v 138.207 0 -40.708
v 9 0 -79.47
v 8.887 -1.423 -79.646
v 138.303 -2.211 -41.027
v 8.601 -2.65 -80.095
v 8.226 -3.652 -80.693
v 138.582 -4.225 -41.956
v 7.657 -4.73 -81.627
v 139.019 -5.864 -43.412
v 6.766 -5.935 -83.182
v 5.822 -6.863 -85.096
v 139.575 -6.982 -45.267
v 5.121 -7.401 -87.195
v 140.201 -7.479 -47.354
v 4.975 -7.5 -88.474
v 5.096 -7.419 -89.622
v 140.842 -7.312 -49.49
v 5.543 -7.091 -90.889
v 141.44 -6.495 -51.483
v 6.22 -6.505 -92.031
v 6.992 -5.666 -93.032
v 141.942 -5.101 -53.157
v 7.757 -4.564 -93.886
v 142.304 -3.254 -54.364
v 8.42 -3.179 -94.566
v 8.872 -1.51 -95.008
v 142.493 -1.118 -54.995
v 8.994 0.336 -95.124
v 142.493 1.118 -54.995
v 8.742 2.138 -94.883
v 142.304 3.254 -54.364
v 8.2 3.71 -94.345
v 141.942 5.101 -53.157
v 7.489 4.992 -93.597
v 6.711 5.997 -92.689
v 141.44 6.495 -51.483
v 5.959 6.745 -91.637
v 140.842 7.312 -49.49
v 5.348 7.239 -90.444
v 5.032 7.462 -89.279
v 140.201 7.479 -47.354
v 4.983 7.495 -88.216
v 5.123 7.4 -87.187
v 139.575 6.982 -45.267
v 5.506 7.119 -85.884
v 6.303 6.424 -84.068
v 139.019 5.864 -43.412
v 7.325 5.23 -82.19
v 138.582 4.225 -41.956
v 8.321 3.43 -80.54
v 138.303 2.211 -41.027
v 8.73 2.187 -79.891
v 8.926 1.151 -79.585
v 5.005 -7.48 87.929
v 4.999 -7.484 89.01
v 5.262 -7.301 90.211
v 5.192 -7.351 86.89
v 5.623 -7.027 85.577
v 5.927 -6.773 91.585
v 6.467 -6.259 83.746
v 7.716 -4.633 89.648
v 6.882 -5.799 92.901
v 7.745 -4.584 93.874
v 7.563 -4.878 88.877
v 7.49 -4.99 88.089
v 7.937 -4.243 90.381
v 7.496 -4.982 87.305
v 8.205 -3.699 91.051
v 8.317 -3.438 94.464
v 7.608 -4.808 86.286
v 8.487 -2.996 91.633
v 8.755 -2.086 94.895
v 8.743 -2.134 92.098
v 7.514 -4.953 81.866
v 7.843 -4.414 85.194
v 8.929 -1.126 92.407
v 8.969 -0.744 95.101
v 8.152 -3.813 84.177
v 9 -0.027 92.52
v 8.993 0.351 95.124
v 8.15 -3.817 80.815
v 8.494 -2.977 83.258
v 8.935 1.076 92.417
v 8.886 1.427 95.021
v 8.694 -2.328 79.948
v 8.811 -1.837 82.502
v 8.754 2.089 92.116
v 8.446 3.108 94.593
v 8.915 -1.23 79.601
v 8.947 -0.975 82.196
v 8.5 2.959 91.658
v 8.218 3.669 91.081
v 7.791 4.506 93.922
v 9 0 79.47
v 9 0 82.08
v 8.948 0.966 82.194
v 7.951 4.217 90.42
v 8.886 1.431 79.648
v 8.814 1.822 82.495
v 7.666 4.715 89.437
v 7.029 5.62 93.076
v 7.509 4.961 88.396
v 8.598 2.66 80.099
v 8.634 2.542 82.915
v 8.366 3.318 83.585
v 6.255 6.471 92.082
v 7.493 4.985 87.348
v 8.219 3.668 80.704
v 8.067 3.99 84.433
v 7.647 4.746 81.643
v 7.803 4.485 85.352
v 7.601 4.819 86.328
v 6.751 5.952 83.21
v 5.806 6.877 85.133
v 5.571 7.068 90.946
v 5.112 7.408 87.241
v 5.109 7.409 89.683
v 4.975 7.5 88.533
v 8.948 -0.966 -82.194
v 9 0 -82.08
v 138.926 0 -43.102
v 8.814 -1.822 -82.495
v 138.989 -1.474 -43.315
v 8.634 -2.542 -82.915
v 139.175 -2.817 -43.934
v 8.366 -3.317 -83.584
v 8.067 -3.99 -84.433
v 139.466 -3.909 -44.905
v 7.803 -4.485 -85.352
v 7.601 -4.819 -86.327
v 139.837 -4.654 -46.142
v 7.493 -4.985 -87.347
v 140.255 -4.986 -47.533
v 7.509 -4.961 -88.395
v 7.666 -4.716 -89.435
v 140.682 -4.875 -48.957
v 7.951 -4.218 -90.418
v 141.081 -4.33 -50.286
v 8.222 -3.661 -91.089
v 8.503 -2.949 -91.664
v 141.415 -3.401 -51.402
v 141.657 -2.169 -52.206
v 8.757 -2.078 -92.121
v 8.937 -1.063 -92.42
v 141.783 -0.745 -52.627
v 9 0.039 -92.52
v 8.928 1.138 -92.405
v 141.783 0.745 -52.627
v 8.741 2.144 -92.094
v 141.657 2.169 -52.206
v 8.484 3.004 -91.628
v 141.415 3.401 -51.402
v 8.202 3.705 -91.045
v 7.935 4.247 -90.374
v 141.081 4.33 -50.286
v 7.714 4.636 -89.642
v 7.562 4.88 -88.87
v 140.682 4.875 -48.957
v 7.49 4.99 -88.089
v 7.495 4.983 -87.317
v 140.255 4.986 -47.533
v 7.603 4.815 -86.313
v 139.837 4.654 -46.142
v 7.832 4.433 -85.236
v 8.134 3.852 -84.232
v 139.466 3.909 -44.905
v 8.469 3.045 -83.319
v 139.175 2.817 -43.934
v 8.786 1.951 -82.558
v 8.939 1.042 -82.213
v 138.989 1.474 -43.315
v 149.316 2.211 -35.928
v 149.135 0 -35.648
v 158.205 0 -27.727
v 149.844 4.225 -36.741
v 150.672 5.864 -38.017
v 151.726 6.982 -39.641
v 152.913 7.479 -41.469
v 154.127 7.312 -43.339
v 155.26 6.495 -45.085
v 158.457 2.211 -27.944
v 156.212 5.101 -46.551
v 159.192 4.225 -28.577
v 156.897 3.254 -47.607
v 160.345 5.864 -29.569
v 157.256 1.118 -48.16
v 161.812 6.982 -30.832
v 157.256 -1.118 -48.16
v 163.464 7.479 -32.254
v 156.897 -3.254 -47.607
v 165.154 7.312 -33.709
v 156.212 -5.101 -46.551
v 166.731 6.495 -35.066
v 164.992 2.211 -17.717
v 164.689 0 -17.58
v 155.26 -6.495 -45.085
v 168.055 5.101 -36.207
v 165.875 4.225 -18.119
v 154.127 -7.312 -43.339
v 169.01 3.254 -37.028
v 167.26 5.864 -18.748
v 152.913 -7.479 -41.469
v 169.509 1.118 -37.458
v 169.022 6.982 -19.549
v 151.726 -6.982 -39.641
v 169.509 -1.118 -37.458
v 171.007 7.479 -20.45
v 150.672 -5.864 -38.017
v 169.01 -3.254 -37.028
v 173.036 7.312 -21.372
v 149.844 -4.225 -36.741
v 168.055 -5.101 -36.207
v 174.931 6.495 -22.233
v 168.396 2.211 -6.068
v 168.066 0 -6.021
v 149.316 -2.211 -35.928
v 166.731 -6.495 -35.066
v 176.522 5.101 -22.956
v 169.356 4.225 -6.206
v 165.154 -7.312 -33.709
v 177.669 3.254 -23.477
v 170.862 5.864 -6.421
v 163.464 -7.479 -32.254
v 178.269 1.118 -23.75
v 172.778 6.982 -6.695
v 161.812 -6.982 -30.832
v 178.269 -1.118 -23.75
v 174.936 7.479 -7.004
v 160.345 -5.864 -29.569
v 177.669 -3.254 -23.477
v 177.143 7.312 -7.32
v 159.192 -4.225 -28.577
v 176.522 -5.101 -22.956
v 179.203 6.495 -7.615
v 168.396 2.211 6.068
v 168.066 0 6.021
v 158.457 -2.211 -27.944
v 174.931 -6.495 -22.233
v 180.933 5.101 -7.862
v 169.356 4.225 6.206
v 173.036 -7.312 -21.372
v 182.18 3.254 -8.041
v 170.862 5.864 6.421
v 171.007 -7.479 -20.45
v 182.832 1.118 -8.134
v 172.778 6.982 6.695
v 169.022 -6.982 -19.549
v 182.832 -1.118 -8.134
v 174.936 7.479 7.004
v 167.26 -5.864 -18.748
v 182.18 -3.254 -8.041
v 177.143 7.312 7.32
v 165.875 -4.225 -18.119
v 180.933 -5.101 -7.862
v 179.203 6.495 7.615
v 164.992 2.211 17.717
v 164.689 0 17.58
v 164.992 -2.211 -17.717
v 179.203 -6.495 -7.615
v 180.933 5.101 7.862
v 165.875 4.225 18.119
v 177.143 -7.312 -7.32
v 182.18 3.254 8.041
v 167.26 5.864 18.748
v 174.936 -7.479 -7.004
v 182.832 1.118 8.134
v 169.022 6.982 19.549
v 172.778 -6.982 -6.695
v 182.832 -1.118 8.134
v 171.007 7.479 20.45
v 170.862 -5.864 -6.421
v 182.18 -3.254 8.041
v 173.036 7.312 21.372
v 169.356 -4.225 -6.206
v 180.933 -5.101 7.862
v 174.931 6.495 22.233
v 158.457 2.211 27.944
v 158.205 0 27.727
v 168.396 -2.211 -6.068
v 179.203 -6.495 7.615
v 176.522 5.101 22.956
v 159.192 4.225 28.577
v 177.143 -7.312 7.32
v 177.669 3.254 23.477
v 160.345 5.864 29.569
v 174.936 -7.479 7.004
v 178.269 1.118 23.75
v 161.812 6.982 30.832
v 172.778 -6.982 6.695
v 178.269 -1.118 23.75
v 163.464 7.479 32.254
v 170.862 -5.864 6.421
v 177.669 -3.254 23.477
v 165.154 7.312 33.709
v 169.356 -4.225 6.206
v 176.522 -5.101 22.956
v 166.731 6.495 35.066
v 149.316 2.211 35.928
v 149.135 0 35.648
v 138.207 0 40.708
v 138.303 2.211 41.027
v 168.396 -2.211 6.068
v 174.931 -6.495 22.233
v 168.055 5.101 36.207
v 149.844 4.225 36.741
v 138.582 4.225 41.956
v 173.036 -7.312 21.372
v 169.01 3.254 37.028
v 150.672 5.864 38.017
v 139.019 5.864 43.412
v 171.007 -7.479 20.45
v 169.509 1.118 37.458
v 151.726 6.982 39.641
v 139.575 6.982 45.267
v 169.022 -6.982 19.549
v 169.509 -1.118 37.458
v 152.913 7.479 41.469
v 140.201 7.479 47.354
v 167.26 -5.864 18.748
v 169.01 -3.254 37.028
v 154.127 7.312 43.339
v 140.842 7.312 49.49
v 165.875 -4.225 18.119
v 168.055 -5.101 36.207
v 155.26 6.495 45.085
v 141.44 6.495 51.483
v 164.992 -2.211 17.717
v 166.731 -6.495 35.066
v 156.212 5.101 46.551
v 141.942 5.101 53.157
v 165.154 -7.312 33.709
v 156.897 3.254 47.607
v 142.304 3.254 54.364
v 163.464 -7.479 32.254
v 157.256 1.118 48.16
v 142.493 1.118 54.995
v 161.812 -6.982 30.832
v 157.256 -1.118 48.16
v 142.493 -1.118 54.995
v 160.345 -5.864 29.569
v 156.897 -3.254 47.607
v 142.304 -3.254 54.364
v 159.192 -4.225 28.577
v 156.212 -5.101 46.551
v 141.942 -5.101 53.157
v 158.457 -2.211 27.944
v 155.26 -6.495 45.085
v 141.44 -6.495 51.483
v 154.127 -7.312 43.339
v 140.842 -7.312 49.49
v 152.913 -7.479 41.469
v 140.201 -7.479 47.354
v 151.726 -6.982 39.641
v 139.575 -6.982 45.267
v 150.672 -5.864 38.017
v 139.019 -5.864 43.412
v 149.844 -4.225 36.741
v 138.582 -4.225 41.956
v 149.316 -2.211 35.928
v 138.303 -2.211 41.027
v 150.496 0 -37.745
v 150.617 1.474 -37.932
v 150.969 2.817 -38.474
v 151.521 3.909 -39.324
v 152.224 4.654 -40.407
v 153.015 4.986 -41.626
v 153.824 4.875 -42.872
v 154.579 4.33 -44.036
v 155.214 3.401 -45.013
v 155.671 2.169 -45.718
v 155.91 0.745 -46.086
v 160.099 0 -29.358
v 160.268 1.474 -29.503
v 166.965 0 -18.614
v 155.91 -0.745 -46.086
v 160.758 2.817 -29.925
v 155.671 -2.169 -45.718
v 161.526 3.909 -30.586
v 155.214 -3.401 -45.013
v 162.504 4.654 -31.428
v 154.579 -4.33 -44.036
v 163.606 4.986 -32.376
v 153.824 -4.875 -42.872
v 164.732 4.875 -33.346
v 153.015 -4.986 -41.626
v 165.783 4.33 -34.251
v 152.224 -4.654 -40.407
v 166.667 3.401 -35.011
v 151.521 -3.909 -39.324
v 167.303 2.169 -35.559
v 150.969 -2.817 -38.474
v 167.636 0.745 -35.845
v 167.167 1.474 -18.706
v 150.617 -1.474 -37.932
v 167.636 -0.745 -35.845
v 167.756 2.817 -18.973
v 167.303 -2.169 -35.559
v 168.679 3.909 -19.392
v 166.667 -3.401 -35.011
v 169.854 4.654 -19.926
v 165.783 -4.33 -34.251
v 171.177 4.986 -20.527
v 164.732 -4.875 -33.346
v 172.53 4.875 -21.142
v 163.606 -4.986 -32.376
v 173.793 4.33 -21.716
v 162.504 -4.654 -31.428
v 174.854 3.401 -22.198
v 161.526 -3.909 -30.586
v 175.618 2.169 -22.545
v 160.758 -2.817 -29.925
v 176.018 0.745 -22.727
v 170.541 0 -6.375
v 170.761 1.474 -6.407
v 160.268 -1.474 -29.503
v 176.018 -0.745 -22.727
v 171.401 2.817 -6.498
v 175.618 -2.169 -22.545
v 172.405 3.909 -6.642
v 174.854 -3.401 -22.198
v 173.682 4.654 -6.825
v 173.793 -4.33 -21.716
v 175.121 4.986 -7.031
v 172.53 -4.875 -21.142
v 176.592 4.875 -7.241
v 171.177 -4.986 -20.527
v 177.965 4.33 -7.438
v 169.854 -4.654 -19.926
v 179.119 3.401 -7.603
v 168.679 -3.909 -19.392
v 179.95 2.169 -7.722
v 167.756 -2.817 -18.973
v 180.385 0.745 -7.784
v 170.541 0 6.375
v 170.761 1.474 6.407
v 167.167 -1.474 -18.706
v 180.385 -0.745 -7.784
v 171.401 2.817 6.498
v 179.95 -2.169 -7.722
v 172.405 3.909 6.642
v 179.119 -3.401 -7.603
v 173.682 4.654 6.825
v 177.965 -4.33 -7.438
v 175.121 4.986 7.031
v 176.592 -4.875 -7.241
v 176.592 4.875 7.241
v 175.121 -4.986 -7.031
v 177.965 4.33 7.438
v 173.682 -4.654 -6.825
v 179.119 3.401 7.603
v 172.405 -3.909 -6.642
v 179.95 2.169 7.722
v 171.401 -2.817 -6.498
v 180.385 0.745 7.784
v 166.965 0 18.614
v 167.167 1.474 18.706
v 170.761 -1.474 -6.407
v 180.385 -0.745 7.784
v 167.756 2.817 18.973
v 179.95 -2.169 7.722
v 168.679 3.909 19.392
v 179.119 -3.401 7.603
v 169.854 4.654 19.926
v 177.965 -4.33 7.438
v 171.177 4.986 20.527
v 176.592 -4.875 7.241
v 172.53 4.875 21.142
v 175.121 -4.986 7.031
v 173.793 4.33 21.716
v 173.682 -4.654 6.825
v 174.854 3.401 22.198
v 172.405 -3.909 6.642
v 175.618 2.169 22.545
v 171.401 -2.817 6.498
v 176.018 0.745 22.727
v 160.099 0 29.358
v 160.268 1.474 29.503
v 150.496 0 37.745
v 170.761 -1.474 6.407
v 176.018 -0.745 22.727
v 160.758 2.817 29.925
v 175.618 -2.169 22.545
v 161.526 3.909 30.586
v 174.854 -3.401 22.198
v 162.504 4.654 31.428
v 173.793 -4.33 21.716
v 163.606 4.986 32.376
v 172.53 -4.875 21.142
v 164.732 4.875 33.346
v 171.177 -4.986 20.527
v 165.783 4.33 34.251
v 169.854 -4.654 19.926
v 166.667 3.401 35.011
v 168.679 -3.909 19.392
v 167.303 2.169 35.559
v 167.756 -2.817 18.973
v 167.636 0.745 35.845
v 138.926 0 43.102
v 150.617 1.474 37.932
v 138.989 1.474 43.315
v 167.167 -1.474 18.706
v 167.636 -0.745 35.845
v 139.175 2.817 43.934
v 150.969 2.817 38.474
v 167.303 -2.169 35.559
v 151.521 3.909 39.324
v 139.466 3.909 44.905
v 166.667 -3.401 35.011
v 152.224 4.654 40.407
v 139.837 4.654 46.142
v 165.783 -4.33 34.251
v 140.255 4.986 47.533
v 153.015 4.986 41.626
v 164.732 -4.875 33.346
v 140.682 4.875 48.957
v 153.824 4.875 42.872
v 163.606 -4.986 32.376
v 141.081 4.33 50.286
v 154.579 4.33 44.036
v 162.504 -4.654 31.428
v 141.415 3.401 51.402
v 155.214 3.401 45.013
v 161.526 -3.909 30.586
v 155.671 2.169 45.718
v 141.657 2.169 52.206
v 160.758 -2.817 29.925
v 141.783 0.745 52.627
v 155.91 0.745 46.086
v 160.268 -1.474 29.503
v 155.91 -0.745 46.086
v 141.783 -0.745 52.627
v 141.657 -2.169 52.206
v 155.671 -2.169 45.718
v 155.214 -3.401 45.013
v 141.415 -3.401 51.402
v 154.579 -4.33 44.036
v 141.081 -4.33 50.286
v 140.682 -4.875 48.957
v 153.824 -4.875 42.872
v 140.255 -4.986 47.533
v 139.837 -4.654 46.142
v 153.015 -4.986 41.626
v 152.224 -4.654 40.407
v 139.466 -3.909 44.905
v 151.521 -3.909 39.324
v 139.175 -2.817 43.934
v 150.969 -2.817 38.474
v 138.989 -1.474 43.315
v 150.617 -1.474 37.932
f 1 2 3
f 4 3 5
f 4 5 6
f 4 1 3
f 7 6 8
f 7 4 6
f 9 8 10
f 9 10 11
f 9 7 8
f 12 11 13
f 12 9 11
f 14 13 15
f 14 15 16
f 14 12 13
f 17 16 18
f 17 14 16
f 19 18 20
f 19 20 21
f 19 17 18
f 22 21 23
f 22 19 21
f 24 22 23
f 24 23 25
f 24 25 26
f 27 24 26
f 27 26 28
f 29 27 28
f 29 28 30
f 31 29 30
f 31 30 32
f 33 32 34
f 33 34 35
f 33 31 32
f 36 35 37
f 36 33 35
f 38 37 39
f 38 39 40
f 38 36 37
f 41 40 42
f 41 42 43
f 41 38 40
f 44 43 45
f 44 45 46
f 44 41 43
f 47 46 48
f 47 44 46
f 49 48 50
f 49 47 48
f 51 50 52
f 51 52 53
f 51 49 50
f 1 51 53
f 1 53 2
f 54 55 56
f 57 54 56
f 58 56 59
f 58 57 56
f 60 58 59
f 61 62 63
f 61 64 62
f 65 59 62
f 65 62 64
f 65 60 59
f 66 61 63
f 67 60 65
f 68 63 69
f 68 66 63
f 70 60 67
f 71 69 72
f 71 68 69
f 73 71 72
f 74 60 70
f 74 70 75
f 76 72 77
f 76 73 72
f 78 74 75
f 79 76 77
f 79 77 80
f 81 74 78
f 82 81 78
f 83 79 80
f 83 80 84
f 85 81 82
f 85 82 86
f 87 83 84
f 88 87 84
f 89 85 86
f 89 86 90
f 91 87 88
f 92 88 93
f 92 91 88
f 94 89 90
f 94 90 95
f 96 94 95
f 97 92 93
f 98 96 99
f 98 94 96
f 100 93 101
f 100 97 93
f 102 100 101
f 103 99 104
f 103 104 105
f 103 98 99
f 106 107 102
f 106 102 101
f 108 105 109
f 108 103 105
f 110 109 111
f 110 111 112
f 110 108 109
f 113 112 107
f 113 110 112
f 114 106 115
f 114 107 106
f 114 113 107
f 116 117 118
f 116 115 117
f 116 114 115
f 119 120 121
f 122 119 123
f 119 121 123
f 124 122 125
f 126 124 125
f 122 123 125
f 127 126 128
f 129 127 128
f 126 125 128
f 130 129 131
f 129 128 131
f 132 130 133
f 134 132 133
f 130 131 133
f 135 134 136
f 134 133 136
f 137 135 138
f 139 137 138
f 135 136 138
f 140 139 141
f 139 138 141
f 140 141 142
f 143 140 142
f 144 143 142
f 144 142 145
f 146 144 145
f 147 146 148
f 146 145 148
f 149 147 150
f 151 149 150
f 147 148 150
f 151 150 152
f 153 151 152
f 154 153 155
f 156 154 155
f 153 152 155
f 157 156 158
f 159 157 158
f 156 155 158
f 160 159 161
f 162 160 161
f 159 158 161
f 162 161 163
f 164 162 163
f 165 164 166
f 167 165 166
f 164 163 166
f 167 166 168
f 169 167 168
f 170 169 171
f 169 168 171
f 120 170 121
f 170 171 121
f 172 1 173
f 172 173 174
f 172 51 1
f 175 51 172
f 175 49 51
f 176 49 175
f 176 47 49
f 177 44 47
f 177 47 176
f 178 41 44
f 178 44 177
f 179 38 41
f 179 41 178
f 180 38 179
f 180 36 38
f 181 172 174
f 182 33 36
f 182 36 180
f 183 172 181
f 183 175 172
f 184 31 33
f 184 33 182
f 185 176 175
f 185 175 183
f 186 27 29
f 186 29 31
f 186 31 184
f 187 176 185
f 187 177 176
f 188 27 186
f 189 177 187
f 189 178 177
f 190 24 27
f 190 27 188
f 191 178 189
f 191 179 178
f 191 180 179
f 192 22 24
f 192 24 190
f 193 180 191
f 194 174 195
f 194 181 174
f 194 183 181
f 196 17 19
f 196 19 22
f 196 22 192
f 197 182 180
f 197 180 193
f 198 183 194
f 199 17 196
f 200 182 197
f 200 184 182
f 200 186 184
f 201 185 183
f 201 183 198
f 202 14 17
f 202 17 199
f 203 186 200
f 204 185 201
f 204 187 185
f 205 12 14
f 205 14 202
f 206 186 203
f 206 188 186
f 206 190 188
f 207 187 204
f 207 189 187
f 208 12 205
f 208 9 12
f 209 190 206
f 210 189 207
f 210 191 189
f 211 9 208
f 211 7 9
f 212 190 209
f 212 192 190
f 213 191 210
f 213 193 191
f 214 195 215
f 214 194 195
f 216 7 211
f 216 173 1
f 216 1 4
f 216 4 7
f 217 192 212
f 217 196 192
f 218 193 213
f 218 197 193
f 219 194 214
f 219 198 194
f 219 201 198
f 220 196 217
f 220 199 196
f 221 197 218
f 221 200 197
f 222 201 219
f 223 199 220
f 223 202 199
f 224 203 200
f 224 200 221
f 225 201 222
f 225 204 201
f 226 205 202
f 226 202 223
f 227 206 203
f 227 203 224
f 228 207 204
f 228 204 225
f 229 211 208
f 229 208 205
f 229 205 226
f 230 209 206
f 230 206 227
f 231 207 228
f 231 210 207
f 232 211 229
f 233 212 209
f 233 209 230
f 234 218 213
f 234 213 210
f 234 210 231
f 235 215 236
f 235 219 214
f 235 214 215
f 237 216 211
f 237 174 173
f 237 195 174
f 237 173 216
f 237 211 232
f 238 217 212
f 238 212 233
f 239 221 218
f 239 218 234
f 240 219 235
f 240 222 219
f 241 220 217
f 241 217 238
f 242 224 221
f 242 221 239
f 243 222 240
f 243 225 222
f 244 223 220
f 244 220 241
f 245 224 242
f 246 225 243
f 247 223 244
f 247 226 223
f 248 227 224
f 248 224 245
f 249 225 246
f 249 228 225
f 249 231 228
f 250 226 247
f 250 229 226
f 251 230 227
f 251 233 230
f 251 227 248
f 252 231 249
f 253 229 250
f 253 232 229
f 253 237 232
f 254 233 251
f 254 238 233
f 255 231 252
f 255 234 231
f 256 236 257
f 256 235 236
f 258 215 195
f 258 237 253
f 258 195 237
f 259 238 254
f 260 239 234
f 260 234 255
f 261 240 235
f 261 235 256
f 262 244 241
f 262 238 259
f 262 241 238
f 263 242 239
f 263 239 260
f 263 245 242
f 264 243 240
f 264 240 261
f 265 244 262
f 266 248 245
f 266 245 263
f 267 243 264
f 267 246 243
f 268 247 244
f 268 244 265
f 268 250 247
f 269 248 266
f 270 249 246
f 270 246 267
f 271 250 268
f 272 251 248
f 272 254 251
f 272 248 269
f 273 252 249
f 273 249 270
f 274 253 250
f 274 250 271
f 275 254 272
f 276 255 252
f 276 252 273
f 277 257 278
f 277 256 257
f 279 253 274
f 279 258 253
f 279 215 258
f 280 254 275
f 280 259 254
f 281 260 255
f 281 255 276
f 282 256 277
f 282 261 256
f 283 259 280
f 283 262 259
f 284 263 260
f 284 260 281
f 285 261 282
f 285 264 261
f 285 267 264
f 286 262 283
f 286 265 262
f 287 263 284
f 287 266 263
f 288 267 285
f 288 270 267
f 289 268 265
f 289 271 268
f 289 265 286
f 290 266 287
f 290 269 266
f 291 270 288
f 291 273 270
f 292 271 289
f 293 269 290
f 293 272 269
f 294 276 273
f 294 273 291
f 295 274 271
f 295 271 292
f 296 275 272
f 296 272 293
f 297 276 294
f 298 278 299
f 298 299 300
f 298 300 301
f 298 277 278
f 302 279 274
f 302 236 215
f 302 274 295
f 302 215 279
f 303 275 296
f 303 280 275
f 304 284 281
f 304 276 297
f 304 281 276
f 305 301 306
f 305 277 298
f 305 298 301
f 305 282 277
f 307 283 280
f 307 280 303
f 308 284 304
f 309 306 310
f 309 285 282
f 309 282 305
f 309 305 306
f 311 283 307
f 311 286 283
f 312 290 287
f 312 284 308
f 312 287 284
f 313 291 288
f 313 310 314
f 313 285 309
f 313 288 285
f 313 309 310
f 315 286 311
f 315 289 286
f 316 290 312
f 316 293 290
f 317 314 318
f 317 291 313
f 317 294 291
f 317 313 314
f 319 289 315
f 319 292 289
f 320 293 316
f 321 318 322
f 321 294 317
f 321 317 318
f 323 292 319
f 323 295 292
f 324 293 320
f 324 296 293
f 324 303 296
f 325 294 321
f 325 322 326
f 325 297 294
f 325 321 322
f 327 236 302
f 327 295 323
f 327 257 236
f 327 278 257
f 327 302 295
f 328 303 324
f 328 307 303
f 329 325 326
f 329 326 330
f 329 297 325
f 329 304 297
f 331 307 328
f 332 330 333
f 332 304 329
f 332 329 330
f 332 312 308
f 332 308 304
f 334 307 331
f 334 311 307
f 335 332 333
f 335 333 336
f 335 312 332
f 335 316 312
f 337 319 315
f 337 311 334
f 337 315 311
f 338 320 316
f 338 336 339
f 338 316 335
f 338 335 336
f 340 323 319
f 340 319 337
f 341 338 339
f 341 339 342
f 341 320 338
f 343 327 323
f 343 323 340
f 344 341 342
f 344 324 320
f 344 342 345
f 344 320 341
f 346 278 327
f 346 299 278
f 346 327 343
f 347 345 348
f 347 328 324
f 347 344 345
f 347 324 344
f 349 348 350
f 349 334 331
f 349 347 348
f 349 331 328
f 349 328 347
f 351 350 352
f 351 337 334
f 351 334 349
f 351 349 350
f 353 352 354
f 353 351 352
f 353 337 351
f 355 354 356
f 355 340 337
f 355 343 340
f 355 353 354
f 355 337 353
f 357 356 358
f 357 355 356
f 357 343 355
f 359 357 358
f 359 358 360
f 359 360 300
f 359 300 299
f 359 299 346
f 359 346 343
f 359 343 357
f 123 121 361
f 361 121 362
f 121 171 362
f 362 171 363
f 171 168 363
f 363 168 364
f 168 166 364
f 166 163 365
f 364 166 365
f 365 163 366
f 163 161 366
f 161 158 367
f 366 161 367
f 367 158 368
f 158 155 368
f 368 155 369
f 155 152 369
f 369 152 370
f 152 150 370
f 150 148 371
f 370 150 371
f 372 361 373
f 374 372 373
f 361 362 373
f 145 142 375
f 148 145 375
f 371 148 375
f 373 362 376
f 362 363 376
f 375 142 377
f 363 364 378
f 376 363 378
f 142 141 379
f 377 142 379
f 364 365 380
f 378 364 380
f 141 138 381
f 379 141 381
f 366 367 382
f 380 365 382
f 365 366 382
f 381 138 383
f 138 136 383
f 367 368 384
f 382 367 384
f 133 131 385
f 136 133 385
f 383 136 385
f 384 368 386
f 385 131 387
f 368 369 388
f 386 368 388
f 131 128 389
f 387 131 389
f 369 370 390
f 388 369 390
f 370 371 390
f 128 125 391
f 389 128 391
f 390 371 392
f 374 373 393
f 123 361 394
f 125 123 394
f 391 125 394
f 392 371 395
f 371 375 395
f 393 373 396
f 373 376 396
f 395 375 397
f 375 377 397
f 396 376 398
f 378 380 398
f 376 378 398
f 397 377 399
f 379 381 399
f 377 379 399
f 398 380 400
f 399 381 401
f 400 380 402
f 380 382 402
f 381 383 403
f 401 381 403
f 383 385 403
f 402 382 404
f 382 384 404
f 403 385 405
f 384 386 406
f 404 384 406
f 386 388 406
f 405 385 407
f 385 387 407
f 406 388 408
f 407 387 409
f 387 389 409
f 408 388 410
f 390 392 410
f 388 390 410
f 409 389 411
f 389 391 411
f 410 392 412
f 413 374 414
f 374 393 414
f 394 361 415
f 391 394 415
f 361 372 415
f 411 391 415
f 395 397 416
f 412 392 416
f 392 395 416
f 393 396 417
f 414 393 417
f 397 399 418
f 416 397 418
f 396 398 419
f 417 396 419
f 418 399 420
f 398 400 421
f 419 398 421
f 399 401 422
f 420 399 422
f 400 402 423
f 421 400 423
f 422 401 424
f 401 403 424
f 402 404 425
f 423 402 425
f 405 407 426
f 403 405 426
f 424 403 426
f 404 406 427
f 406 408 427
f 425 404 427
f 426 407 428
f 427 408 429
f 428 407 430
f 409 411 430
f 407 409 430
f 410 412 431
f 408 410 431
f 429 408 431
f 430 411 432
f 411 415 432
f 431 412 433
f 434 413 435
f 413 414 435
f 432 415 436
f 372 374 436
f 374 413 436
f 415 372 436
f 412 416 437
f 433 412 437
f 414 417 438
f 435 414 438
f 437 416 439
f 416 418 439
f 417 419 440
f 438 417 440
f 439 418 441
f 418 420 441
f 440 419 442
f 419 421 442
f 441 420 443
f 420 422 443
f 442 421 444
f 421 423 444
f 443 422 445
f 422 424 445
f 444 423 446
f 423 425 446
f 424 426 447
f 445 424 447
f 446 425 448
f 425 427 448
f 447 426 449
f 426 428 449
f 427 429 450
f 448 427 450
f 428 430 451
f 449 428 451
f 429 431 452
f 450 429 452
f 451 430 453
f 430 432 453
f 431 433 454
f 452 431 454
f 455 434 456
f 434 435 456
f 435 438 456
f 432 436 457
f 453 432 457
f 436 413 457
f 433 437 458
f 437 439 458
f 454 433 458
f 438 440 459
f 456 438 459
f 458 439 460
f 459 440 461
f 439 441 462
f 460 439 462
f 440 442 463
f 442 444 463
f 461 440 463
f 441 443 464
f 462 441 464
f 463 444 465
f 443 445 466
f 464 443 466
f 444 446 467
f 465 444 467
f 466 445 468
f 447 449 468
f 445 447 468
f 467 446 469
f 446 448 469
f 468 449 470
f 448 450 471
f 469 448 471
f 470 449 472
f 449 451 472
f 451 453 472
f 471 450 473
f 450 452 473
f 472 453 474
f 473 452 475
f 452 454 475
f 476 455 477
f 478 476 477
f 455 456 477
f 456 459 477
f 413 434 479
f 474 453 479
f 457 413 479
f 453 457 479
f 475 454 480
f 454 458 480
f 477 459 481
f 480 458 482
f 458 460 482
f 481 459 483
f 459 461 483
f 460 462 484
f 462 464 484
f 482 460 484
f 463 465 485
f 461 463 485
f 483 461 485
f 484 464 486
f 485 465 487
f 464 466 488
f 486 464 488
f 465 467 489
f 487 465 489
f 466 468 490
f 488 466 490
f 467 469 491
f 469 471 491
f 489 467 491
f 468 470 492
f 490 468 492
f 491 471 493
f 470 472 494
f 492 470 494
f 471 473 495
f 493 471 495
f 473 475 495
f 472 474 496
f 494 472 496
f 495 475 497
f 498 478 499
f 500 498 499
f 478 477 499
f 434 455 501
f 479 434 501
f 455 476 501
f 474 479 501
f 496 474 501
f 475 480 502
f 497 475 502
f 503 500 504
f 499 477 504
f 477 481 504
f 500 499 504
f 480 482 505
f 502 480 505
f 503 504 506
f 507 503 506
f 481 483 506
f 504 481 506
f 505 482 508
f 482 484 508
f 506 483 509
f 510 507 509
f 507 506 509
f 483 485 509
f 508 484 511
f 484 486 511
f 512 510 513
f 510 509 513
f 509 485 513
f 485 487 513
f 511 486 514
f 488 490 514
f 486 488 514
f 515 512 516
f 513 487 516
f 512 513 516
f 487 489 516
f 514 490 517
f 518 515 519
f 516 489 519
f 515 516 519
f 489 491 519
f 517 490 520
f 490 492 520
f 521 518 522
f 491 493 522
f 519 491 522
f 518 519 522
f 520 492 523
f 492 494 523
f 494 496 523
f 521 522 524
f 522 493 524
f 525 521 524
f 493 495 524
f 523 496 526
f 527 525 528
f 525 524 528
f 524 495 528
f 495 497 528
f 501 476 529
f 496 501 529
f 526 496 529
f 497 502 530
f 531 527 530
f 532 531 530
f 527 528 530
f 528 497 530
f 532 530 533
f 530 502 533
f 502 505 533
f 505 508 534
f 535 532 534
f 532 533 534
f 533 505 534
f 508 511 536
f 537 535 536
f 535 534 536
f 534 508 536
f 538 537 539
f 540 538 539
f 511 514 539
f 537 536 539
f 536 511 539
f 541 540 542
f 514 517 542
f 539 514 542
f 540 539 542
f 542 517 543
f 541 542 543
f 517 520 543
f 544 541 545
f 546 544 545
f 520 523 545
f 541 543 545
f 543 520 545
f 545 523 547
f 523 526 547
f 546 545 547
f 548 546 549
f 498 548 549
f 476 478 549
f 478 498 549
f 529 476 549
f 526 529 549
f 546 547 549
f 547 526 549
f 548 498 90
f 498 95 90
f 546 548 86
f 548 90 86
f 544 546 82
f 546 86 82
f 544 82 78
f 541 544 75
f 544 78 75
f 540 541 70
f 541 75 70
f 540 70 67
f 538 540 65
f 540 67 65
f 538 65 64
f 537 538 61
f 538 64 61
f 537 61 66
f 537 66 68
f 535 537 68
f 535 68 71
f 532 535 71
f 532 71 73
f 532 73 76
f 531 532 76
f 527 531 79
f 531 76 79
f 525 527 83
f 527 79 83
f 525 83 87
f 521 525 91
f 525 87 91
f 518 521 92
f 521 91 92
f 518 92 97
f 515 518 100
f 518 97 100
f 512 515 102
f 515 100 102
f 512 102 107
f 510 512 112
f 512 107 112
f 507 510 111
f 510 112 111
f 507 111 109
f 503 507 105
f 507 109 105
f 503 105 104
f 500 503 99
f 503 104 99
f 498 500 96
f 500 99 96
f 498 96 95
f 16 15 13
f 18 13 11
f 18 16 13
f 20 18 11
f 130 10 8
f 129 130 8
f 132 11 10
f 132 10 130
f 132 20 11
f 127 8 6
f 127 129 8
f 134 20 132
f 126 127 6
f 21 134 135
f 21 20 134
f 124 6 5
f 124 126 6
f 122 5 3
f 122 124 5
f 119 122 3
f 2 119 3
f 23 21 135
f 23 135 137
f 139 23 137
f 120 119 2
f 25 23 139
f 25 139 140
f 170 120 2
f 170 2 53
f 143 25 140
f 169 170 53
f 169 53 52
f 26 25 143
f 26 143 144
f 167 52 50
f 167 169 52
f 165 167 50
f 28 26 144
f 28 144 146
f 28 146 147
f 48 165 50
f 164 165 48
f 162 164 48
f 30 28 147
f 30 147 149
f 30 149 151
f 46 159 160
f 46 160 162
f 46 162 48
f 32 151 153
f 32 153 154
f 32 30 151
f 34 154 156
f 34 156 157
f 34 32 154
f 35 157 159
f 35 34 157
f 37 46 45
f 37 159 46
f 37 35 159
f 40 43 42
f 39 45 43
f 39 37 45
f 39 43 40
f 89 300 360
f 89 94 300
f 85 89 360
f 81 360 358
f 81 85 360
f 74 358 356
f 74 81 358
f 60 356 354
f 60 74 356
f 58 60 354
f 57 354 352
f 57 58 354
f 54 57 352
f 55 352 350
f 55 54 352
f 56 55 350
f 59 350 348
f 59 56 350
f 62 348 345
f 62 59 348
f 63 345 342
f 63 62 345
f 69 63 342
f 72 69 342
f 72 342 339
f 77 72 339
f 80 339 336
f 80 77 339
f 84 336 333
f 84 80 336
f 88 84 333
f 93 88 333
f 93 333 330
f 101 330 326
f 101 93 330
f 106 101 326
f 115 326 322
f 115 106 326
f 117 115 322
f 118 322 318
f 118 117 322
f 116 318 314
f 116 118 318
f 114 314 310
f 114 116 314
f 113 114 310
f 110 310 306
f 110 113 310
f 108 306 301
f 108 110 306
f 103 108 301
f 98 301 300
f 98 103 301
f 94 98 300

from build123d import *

# Parameters (mm, degrees)
SWEEP_THIN1_PROFILE_R   = 7.5
SWEEP_THIN1_PROFILE_R_2 = 5
CUT_EXTRUDE2_DEPTH      = 208.777034922
CUT_EXTRUDE2_DEPTH_BACK = 208.777034922
SKETCH34_R              = 9


with BuildPart() as part:
    # Sweep-Thin1: sweep along a path in Sketch1
    with BuildLine(Plane(origin=(0, 0, 0), x_dir=(1, 0, 0), z_dir=(0, 1, 0))) as sweep_thin1_path:
        Line((0, 90), (140.362285796, 47.891314261))
        ThreePointArc((140.362285796, 47.891314261), (175.994891518, 0), (140.362285796, -47.891314261))
        Line((140.362285796, -47.891314261), (0, -90))
    # Sweep-Thin1 profile (on start of the path) → Sweep-Thin1 (sweep)
    with BuildSketch(Plane(origin=(0, 0, -90), x_dir=(-0.2873478855663455, 0, 0.9578262852211514), z_dir=(0.9578262852211514, 0, 0.2873478855663455))):
        Circle(SWEEP_THIN1_PROFILE_R)
        Circle(SWEEP_THIN1_PROFILE_R_2, mode=Mode.SUBTRACT)
    sweep(path=sweep_thin1_path.line)

    # Sketch34 → Cut-Extrude2 (cut, two sides: drawn at the far end of the back side and taken through both)
    with BuildSketch(Plane.XY.offset(-CUT_EXTRUDE2_DEPTH_BACK)):
        Circle(SKETCH34_R)
    extrude(amount=CUT_EXTRUDE2_DEPTH + CUT_EXTRUDE2_DEPTH_BACK, mode=Mode.SUBTRACT)


solid = part.part
